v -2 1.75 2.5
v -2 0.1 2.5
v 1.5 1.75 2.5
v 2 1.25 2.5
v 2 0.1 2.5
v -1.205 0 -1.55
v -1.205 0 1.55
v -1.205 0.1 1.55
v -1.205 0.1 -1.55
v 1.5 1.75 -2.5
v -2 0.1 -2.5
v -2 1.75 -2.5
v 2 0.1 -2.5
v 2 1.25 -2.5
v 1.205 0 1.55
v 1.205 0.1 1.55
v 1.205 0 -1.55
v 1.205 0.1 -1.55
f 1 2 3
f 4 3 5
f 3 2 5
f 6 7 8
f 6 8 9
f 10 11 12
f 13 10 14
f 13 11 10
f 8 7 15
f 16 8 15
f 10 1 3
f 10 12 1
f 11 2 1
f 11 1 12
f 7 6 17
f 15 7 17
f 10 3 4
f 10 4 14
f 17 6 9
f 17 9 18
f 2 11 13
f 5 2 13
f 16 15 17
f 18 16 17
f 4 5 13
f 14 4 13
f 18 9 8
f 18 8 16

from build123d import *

# Parameters (mm, degrees)
EXTRUDE_START   = 0.1
SKETCH_1_W      = 4
SKETCH_1_H      = 5
EXTRUDE_1_DEPTH = 1.65
CHAMFER_1_SIZE  = 0.5
SKETCH_2_W      = 2.41
SKETCH_2_H      = 3.1
EXTRUDE_2_DEPTH = 0.1


with BuildPart() as part:
    # Эскиз1 → Бобышка-Вытянуть1 (new body)
    with BuildSketch(Plane(origin=(0, 0, 0), x_dir=(1, 0, 0), z_dir=(0, 1, 0)).offset(EXTRUDE_START)):
        Rectangle(SKETCH_1_W, SKETCH_1_H)
    extrude(amount=EXTRUDE_1_DEPTH)

    # Фаска1
    chamfer_1_edges = [part.edges().sort_by_distance(p)[0] for p in [
        (2, 1.75, 0),
    ]]
    chamfer(chamfer_1_edges, length=CHAMFER_1_SIZE)


with BuildPart() as body_2:
    # Эскиз2 → Бобышка-Вытянуть2 (new body)
    with BuildSketch(Plane(origin=(0, 0, 0), x_dir=(1, 0, 0), z_dir=(0, 1, 0))):
        Rectangle(SKETCH_2_W, SKETCH_2_H)
    extrude(amount=EXTRUDE_2_DEPTH)


solid = Compound([part.part, body_2.part])
